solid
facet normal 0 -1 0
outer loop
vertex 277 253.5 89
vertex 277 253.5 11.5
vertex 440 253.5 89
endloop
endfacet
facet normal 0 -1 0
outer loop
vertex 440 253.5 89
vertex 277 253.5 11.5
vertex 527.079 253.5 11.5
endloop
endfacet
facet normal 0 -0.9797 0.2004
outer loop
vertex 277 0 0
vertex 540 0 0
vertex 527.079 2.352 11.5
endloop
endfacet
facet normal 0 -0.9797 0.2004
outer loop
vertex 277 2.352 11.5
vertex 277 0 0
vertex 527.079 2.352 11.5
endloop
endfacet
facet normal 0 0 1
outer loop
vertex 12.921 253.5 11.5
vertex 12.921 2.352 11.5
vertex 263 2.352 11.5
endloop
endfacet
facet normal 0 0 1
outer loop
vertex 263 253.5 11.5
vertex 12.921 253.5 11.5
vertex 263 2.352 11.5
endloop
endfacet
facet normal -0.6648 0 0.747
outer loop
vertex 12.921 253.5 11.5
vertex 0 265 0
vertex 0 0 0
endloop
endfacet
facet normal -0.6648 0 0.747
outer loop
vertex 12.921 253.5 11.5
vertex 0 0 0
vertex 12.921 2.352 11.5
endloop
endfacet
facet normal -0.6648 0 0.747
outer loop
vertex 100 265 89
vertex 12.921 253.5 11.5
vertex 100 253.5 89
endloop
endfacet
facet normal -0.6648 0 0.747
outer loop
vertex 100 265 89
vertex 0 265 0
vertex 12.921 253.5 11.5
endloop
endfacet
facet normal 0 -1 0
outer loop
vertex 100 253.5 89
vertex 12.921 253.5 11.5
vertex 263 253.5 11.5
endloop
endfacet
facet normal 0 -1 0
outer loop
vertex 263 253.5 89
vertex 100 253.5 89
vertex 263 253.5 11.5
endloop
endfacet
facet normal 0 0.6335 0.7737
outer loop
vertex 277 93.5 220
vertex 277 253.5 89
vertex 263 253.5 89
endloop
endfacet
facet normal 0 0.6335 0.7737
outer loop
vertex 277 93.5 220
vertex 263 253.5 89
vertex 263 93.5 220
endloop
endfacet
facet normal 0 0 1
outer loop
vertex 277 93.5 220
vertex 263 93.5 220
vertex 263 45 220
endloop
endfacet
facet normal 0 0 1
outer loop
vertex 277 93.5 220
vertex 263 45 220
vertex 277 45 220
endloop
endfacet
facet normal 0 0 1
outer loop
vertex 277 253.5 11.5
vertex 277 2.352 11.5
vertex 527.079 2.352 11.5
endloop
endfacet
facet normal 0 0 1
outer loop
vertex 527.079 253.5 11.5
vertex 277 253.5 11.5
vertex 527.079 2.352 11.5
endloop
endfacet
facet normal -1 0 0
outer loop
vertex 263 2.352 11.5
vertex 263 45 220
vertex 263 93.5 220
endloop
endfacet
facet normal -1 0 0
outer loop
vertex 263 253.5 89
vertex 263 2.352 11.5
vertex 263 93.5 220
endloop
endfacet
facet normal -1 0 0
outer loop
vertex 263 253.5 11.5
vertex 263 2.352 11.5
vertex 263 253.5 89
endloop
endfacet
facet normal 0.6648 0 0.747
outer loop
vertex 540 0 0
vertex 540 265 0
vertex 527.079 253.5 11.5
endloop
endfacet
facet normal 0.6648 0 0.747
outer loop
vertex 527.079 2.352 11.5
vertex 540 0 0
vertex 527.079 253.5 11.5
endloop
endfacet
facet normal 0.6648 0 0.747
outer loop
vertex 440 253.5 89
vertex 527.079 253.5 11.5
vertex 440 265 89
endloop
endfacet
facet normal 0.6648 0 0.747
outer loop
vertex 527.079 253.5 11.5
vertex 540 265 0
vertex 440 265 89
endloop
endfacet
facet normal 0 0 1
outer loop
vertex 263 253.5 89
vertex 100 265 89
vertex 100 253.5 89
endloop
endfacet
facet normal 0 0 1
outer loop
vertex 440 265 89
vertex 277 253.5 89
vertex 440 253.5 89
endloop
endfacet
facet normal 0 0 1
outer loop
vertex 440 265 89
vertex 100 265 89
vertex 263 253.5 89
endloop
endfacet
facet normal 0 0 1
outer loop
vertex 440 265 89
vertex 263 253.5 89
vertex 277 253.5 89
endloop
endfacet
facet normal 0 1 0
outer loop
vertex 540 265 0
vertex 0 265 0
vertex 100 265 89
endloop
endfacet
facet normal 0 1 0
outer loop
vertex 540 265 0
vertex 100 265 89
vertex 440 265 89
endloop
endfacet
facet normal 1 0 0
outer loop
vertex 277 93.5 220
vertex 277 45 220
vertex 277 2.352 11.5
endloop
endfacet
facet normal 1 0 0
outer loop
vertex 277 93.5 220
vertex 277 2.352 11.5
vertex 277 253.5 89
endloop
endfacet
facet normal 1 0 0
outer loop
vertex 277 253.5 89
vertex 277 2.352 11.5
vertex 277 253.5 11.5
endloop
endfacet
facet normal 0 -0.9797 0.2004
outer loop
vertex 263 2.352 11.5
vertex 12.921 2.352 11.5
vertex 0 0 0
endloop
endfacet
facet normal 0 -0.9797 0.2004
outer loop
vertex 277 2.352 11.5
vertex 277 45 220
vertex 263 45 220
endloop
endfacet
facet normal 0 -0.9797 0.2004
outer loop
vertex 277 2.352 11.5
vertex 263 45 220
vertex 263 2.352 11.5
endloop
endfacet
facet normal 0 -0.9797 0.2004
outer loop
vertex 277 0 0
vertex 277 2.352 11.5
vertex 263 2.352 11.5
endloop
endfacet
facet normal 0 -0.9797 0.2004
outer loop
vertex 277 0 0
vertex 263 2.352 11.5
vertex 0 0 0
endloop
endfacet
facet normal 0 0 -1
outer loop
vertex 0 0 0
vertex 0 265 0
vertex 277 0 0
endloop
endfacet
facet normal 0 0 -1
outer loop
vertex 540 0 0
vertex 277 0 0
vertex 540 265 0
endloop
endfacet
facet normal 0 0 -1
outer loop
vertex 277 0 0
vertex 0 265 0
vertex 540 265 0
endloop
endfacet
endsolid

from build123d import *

# Parameters (mm, degrees)
SKETCH_1_W          = 540
SKETCH_1_H          = 265
EXTRUDE_505_DEPTH   = 11.5
SKETCH_2_W          = 540
SKETCH_2_H          = 11.5
EXTRUDE_1_DEPTH     = 77.5
CUT_EXTRUDE_1_DEPTH = 609.067430471
SKETCH_5_W          = 14
SKETCH_5_H          = 253.5
EXTRUDE_2_DEPTH     = 208.5
CUT_EXTRUDE_3_DEPTH = 442.988687638
CUT_EXTRUDE_4_DEPTH = 442.988687638


with BuildPart() as part:
    # 草图1 → Extrude 505 (new body)
    with BuildSketch(Plane.XY):
        with Locations((270, 132.5)):
            Rectangle(SKETCH_1_W, SKETCH_1_H)
    extrude(amount=EXTRUDE_505_DEPTH)

    # 草图2 → 凸台-拉伸1 (add)
    with BuildSketch(Plane.XY.offset(11.5)):
        with Locations((270, 259.25)):
            Rectangle(SKETCH_2_W, SKETCH_2_H)
    extrude(amount=EXTRUDE_1_DEPTH)

    # 草图3 → 切除-拉伸1 (cut, through all)
    with BuildSketch(Plane(origin=(0, 265, 0), x_dir=(-1, 0, 0), z_dir=(0, 1, 0))):
        Polygon((0, 0), (-100, 89), (0, 89), align=None)
        Polygon((-540, 0), (-440, 89), (-540, 89), align=None)
    extrude(amount=-CUT_EXTRUDE_1_DEPTH, mode=Mode.SUBTRACT)

    # 草图5 → 凸台-拉伸2 (add)
    with BuildSketch(Plane.XY.offset(11.5)):
        with Locations((270, 126.75)):
            Rectangle(SKETCH_5_W, SKETCH_5_H)
    extrude(amount=EXTRUDE_2_DEPTH)

    # 草图6 → 切除-拉伸3 (cut, through all)
    with BuildSketch(Plane(origin=(277, 0, 0), x_dir=(0, 0, -1), z_dir=(1, 0, 0))):
        Polygon((-89, 253.5), (-220, 93.5), (-220, 253.5), align=None)
        Polygon((-220, 45), (0, 0), (-220, 0), align=None)
    extrude(amount=-CUT_EXTRUDE_3_DEPTH, mode=Mode.SUBTRACT)

    # 草图7 → 切除-拉伸4 (cut, through all)
    with BuildSketch(Plane.ZY.offset(-277)):
        Polygon((0, 0), (11.5, 2.352272727), (11.5, 0), align=None)
    extrude(amount=-CUT_EXTRUDE_4_DEPTH, mode=Mode.SUBTRACT)


solid = part.part
